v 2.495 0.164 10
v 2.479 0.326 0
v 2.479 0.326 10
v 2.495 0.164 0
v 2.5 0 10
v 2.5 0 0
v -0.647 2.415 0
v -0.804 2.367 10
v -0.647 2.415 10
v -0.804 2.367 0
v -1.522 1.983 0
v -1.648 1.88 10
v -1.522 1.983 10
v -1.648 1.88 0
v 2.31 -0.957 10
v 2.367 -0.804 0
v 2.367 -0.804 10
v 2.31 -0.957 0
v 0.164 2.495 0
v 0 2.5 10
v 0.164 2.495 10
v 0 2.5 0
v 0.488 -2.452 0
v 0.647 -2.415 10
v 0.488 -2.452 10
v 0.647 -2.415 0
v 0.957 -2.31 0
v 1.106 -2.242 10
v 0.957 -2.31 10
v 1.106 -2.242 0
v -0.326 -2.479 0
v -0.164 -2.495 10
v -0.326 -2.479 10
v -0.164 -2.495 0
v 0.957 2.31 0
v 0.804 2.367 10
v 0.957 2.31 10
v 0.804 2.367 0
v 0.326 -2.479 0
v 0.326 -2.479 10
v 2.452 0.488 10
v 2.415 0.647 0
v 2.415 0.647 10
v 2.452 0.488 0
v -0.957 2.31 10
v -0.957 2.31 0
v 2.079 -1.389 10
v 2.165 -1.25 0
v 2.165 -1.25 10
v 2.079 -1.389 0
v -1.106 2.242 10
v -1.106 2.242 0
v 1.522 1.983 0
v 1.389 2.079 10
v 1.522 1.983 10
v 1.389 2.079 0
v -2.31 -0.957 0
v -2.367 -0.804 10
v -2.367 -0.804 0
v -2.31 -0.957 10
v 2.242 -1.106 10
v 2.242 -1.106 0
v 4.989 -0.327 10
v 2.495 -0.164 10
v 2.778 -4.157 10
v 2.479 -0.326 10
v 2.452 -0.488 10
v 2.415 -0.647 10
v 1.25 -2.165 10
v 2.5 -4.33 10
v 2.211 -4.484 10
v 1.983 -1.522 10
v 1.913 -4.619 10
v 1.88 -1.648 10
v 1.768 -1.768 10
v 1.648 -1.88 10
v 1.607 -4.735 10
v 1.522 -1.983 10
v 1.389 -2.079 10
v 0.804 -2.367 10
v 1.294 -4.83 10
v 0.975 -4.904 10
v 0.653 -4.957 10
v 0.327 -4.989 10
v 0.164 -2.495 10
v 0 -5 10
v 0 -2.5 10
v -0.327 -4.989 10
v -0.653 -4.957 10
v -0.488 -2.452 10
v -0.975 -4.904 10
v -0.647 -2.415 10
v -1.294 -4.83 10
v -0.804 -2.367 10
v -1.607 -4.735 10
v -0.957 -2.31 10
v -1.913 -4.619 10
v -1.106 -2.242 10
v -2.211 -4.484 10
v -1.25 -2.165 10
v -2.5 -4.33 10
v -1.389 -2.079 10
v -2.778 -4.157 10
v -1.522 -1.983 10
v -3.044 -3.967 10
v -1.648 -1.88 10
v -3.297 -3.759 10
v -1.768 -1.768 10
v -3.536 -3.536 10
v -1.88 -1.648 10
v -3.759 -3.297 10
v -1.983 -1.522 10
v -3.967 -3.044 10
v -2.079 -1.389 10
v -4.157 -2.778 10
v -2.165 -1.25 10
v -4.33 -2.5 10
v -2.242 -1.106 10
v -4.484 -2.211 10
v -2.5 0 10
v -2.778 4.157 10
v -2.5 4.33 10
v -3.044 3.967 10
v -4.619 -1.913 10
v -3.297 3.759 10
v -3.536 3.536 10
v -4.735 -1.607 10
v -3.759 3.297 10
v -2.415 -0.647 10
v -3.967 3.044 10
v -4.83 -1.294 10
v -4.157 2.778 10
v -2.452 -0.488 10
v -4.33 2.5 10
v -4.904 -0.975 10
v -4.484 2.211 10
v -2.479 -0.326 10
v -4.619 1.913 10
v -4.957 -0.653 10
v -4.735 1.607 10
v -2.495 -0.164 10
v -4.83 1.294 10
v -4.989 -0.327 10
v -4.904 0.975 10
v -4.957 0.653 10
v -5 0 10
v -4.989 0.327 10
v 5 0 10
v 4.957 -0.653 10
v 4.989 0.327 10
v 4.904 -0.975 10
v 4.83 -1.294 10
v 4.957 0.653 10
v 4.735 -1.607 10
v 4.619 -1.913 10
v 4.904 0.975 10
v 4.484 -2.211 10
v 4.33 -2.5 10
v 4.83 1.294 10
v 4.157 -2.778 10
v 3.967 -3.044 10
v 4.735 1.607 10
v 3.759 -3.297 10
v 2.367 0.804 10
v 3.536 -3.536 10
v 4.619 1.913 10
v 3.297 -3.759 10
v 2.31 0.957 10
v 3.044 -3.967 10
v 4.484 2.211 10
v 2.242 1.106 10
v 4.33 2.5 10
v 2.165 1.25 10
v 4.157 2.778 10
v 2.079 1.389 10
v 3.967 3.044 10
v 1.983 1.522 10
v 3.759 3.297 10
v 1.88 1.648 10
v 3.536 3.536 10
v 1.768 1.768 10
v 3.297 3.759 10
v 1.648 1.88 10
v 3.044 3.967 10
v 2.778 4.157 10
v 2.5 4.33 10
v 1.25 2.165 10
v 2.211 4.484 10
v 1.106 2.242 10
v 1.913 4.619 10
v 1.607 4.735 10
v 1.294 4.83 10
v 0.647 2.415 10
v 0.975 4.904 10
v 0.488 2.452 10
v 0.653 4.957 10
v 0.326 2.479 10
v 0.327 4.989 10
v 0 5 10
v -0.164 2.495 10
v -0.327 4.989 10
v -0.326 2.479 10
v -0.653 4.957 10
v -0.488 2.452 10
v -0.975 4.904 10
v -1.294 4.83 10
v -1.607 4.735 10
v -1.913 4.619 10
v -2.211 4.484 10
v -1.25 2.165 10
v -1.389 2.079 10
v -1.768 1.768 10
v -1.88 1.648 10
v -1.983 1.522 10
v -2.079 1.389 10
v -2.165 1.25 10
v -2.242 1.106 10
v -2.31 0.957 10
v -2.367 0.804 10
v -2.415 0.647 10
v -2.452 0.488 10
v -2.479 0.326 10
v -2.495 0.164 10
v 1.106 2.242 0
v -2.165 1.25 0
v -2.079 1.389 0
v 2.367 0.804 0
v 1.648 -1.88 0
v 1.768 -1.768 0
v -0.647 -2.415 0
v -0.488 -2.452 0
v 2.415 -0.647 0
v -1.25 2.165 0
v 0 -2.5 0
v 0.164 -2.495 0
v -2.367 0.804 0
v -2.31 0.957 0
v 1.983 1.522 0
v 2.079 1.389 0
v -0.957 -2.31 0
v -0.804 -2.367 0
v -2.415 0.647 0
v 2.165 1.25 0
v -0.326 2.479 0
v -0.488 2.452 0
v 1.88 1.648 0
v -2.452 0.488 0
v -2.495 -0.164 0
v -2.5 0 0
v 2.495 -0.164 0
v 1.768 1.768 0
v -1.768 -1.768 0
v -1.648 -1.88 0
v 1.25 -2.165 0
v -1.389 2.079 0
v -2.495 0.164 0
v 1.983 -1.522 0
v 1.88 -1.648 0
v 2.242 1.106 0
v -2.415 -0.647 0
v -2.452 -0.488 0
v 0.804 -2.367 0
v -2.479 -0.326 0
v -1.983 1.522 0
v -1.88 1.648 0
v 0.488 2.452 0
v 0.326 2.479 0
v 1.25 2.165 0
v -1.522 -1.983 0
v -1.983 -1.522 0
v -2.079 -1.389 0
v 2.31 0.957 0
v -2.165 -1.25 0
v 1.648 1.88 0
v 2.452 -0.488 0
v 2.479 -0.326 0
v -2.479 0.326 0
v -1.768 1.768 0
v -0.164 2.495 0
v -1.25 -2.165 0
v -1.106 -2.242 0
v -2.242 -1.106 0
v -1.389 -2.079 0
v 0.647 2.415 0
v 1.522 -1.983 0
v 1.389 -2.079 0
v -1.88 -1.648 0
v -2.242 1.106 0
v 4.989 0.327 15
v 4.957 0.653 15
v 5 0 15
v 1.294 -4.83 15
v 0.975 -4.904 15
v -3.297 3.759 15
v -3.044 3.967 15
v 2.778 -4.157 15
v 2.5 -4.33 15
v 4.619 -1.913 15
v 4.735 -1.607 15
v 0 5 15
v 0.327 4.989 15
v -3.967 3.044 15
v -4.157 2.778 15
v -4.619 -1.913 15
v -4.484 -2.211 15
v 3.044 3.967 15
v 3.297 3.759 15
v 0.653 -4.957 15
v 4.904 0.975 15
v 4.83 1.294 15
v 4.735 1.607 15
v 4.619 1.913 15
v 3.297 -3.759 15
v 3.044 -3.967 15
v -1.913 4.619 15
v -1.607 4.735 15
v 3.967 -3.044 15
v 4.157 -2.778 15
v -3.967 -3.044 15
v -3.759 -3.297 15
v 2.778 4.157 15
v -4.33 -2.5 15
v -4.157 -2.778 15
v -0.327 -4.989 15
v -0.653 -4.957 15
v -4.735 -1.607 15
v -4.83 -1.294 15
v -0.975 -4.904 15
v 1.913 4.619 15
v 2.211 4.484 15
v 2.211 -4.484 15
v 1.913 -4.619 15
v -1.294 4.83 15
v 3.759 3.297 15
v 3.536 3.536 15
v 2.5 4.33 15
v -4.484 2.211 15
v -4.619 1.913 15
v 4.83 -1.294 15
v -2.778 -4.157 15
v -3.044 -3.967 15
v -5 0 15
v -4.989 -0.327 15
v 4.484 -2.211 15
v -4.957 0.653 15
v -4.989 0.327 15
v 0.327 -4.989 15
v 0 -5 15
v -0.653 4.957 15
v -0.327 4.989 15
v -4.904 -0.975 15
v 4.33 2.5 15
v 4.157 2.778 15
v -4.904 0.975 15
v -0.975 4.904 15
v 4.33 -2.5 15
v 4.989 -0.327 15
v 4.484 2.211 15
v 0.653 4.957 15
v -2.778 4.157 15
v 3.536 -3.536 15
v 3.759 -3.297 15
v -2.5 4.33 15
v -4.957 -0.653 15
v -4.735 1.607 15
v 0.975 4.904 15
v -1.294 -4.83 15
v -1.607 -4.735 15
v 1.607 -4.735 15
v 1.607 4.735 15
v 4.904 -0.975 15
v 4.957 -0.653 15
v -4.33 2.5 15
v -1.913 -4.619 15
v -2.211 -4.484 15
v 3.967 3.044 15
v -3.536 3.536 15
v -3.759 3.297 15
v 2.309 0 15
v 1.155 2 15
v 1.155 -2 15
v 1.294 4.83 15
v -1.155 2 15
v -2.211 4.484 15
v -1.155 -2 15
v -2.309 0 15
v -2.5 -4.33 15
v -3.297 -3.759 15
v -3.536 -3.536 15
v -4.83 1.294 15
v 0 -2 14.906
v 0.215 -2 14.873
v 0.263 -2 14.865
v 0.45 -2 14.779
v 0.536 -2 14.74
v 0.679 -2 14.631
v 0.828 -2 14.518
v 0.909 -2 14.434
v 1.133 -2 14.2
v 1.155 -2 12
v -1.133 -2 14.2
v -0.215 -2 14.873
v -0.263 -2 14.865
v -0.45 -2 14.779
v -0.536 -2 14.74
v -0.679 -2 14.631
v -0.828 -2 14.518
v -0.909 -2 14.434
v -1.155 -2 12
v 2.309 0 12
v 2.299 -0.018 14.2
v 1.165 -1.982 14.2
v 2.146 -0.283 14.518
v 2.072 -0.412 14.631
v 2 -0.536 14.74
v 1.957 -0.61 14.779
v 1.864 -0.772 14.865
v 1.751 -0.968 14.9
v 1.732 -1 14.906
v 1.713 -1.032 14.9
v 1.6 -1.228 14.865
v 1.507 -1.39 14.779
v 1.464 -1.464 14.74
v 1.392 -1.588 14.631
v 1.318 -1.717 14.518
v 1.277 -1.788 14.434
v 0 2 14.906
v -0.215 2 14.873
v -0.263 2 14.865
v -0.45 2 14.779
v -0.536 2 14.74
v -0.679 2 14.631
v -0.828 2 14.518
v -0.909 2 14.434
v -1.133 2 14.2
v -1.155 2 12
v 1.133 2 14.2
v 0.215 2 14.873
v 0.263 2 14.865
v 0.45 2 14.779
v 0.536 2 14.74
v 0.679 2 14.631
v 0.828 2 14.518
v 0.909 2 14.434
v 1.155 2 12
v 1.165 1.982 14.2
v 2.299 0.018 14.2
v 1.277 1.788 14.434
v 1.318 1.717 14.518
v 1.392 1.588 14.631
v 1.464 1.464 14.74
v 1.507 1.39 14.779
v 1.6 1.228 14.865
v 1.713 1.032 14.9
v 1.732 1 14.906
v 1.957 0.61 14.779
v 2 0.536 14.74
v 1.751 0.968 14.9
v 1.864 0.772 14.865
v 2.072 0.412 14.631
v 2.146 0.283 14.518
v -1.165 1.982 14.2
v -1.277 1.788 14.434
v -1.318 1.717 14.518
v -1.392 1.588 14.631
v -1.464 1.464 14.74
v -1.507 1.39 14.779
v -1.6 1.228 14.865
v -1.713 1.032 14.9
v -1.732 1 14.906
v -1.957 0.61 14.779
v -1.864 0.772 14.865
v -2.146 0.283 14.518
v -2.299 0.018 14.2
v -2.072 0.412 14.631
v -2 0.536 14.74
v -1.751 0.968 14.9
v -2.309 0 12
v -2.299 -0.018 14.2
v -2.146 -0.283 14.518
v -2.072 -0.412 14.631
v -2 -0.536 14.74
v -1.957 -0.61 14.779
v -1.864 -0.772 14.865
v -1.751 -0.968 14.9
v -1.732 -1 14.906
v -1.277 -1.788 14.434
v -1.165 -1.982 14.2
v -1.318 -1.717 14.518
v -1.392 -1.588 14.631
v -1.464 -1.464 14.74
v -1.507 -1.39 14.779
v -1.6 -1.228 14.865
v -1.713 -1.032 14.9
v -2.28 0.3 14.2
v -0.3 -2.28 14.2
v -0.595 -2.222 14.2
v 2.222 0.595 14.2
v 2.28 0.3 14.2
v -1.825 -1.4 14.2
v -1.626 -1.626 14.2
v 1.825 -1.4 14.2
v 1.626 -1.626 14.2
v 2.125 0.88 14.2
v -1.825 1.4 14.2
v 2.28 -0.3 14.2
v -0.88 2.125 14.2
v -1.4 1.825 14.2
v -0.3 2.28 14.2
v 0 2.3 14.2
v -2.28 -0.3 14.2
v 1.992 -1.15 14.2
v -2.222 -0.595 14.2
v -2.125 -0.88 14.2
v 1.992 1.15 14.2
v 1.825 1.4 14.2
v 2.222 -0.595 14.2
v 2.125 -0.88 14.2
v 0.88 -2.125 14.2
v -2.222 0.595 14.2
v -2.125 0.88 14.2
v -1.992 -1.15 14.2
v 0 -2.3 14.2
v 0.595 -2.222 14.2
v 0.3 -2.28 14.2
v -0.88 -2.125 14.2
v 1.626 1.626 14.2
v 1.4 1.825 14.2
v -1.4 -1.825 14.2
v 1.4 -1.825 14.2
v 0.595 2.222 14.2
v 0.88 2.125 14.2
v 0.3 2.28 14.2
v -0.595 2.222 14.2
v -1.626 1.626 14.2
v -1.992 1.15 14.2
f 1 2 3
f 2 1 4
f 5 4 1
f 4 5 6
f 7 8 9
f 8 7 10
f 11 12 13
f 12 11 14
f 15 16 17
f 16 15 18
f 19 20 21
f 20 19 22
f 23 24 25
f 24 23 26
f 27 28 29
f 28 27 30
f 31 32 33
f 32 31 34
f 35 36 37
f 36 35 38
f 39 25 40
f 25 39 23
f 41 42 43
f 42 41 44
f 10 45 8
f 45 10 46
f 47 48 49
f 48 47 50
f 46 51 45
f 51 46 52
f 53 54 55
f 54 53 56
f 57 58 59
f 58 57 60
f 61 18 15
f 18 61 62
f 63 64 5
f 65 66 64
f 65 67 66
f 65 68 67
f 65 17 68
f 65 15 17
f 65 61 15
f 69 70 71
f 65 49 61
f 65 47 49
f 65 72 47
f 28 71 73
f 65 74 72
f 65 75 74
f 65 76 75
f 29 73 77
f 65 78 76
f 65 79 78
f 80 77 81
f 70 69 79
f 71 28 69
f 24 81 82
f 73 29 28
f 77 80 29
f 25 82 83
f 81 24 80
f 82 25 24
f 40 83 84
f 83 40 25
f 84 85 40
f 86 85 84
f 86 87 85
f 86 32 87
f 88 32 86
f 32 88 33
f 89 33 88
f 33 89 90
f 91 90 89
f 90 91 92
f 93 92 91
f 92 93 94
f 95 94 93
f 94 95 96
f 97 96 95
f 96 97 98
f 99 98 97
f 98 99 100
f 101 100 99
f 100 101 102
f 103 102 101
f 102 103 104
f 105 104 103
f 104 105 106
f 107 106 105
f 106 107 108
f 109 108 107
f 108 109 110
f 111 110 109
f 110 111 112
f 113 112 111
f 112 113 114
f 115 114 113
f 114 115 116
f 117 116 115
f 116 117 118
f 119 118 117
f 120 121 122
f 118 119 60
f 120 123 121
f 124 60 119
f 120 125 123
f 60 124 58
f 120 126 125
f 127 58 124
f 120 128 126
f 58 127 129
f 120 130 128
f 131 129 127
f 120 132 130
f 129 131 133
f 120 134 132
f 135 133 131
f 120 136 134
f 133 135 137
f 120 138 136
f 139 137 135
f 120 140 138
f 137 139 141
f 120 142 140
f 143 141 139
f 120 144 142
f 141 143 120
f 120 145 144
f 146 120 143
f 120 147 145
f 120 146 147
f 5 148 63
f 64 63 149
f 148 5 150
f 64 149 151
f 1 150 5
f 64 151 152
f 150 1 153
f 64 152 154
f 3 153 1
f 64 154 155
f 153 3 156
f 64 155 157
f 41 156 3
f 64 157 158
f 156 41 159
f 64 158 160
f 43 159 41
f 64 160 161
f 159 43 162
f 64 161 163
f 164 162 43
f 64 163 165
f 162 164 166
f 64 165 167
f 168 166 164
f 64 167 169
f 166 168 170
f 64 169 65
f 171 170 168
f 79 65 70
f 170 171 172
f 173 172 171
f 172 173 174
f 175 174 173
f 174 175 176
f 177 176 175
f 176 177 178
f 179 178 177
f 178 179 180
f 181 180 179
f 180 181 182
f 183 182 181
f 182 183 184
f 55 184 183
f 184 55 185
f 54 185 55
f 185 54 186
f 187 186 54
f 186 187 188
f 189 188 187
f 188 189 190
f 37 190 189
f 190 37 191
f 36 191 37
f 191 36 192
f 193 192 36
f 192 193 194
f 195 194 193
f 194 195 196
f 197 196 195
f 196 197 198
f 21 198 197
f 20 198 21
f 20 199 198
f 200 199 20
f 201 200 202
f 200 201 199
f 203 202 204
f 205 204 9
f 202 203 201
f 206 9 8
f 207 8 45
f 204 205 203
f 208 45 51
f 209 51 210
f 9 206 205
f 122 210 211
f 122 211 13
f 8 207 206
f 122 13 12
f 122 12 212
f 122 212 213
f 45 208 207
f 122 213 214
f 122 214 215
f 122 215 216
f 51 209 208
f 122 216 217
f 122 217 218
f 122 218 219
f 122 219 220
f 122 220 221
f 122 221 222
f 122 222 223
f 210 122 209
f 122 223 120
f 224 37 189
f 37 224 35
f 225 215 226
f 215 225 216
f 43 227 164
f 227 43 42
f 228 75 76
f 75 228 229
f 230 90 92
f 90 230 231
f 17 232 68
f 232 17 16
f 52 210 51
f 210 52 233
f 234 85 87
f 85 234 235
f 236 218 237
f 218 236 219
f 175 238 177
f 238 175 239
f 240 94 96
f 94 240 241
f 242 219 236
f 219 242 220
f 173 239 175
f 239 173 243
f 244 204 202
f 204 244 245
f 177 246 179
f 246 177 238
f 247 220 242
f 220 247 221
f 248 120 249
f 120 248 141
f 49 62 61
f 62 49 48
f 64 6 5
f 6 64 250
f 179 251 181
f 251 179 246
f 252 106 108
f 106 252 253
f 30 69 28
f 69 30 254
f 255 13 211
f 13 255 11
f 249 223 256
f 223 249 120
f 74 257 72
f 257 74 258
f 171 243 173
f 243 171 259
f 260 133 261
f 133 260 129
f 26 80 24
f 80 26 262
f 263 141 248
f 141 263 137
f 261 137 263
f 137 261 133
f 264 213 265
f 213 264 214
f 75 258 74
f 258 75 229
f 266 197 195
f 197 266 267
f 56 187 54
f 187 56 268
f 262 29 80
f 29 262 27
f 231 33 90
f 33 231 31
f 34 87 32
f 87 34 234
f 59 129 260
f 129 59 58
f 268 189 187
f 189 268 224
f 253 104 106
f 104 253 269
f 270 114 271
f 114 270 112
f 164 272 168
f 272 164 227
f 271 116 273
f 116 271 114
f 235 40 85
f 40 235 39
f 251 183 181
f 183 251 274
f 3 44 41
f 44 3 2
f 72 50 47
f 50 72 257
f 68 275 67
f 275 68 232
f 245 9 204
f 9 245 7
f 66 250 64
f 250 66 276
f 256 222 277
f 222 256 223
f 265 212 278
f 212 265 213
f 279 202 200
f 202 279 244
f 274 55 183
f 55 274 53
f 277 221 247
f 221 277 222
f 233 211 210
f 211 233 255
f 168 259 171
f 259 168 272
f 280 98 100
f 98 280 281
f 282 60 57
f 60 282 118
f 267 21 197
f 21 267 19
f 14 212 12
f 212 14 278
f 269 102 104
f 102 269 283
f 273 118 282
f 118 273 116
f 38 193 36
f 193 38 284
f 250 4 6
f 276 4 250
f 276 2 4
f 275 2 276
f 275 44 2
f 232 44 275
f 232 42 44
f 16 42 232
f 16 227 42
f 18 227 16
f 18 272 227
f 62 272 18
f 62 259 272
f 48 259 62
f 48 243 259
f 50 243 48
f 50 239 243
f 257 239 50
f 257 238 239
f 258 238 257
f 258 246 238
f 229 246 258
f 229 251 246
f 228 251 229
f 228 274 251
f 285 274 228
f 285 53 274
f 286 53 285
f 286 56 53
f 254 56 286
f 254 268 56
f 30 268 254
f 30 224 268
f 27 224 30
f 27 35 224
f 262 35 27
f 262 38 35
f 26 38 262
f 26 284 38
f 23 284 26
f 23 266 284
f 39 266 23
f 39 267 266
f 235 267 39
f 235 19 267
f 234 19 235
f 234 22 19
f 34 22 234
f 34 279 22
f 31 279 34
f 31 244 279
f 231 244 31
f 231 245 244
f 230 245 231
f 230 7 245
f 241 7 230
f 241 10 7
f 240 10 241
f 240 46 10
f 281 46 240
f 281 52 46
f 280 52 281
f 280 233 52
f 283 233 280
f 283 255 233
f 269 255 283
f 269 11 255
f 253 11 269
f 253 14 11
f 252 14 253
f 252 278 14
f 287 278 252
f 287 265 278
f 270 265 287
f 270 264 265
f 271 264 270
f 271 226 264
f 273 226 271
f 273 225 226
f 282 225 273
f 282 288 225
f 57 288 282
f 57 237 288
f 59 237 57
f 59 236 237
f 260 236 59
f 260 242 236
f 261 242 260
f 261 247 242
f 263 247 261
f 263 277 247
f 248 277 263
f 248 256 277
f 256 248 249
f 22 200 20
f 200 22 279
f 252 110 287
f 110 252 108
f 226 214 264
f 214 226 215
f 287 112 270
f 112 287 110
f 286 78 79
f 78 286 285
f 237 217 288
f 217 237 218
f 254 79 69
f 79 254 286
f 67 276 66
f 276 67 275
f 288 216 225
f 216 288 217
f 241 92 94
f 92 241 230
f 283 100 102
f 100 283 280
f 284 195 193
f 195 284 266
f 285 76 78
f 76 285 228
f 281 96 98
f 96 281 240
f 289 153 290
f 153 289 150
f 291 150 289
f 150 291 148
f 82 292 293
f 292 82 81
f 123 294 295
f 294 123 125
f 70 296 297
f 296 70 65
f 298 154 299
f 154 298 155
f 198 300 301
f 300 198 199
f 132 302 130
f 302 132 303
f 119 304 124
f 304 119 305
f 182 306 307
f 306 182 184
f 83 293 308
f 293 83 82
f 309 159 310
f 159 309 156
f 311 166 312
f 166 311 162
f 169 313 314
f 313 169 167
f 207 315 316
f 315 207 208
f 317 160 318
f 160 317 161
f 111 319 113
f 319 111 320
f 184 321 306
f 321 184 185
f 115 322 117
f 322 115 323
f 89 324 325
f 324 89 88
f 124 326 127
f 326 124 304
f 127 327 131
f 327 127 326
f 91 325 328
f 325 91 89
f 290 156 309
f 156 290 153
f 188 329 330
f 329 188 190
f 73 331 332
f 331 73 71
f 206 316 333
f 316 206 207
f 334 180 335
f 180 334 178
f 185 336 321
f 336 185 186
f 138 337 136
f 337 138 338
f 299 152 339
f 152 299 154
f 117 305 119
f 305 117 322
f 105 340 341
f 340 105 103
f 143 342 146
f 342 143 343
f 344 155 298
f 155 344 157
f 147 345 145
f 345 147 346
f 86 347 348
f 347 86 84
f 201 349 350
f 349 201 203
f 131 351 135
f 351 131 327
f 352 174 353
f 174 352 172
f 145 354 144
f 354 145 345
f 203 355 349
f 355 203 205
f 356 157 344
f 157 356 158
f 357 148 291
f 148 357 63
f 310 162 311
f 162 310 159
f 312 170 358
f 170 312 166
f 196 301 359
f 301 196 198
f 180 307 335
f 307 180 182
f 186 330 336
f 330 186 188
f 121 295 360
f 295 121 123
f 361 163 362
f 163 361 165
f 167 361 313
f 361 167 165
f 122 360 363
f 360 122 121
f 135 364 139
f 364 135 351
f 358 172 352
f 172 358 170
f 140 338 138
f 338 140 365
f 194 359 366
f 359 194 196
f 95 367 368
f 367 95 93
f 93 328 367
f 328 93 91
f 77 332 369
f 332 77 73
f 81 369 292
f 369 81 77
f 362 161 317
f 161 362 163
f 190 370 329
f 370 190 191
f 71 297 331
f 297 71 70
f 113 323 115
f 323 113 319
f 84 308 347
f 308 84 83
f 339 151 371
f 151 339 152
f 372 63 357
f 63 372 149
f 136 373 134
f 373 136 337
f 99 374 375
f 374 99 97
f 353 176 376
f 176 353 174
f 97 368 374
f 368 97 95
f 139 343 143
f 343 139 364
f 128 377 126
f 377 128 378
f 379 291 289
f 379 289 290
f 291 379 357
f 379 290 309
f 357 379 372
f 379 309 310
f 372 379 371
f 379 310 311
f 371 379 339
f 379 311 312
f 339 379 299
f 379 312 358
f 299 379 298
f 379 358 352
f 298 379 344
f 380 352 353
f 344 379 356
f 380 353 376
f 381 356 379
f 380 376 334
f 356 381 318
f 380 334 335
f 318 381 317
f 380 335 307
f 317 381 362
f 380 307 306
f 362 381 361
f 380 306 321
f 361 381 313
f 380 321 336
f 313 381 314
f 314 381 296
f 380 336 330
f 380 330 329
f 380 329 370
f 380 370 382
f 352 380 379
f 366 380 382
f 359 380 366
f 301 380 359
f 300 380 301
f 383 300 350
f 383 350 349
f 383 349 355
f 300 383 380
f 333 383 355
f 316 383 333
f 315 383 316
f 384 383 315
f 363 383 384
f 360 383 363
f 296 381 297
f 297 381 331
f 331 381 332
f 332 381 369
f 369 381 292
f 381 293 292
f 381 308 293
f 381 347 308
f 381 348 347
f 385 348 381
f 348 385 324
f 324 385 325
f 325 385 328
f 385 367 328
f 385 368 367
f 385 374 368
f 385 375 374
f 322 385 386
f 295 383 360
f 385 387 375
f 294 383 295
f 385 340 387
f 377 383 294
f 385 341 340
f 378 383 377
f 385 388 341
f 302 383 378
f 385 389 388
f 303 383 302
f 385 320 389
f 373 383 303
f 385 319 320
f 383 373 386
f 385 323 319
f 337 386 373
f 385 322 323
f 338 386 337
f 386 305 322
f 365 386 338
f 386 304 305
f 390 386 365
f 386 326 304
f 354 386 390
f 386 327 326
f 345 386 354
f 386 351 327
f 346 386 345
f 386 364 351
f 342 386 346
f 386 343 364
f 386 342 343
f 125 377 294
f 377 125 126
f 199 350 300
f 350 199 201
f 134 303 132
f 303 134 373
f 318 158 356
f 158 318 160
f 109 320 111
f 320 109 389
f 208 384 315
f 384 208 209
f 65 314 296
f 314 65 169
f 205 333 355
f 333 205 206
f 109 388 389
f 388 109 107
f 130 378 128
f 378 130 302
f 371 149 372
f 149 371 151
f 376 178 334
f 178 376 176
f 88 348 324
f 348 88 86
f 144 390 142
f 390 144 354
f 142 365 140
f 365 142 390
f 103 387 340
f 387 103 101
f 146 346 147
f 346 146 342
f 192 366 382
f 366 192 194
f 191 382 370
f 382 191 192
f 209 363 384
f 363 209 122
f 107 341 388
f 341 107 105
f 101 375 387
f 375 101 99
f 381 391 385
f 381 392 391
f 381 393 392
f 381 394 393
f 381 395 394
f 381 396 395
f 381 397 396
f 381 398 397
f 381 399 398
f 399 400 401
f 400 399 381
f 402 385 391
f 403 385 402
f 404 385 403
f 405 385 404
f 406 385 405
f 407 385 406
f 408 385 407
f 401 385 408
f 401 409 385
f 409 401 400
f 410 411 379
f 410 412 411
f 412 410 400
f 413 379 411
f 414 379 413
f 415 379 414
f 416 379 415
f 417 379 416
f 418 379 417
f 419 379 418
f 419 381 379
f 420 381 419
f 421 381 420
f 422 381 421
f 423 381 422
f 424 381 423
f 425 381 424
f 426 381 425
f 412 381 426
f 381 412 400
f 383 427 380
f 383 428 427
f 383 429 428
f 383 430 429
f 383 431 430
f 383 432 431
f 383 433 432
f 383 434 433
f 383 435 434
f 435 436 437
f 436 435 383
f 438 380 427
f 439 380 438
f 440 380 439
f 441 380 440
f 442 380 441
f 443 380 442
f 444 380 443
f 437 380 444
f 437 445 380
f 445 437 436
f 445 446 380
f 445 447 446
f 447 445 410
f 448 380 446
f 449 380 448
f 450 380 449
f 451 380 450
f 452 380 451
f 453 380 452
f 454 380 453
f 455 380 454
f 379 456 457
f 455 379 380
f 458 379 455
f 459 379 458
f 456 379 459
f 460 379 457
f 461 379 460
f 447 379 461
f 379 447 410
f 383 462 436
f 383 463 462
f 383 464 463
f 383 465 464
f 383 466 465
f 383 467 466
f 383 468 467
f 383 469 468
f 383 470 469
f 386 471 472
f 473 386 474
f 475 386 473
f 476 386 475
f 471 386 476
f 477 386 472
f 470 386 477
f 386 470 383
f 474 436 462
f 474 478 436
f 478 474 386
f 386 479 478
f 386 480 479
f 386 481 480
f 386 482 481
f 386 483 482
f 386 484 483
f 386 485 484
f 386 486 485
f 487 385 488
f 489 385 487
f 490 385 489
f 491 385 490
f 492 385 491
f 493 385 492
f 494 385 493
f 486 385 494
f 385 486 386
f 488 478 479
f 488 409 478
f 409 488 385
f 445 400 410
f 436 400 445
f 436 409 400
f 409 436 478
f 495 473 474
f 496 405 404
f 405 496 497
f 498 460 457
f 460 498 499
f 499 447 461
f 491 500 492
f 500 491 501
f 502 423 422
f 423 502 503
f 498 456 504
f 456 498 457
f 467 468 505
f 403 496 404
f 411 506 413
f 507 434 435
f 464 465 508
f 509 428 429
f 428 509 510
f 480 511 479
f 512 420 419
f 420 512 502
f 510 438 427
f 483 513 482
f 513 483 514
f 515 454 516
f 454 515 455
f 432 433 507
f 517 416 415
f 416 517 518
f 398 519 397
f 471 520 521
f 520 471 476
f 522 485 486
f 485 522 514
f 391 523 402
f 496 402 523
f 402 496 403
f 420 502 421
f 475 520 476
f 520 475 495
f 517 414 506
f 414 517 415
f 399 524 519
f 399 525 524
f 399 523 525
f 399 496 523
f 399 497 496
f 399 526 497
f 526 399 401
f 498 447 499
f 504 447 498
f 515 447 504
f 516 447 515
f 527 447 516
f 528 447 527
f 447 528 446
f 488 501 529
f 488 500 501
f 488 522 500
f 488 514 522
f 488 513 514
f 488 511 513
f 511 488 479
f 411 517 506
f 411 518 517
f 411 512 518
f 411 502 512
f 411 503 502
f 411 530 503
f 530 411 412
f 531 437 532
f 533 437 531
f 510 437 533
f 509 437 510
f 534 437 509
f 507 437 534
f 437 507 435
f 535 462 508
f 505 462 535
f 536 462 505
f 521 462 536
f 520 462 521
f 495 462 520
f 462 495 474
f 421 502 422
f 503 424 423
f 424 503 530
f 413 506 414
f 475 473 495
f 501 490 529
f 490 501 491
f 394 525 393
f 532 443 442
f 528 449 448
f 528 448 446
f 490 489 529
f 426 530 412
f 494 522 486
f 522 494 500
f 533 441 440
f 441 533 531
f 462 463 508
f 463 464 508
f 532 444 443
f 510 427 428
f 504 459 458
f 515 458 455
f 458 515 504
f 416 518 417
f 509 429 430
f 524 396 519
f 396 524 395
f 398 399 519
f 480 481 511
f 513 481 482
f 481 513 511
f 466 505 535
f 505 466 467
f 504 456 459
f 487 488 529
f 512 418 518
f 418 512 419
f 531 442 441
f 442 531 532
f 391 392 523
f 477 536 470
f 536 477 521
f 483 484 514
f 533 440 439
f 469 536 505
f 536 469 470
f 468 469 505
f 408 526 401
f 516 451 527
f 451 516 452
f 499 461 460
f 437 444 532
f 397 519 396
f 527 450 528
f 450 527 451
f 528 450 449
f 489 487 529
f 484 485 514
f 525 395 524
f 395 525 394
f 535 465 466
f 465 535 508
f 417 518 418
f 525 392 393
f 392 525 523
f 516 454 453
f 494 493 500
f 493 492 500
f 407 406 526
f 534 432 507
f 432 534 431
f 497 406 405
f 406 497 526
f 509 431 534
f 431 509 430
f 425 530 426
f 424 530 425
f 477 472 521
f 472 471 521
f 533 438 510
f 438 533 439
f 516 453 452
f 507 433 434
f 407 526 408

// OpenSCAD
$fn = 96;

// Socket Head Cap Screw (approximate, renderable)
// Given: shank diameter = 5.0mm, head diameter = 10.0mm, length under head = 10mm

d_shank = 5.0;
d_head  = 10.0;
L       = 10.0;

// Typical proportions for an M5 socket head cap screw (approx.)
head_h      = 5.0;   // head height
hex_flat    = 4.0;   // hex key size across flats (M5 typically 4mm)
hex_depth   = 3.0;   // socket depth
tip_chamfer = 0.6;   // small chamfer at end of shank
head_edge_r = 0.4;   // slight rounding approximation via chamfer

module hex_prism(af, h){
    // Regular hex with given across-flats (af)
    // For a regular hex, circumradius R = af / sqrt(3)
    R = af / sqrt(3);
    cylinder(h=h, r=R, $fn=6);
}

module screw(){
    difference(){
        union(){
            // Shank
            cylinder(h=L, d=d_shank);

            // Tip chamfer (simple frustum)
            translate([0,0,0])
                cylinder(h=tip_chamfer, d1=d_shank*0.85, d2=d_shank);

            // Head with slight edge chamfer approximation
            translate([0,0,L])
                cylinder(h=head_h, d=d_head);

            // Head top chamfer (subtract later would be nicer; approximate by adding a small frustum)
            translate([0,0,L+head_h-head_edge_r])
                cylinder(h=head_edge_r, d1=d_head, d2=d_head*0.96);
        }

        // Hex socket
        translate([0,0,L+head_h-hex_depth])
            hex_prism(hex_flat, hex_depth + 0.2);

        // Slight lead-in at socket opening
        translate([0,0,L+head_h-0.8])
            cylinder(h=0.8, d1=hex_flat*1.15, d2=hex_flat*0.98, $fn=48);
    }
}

screw();
